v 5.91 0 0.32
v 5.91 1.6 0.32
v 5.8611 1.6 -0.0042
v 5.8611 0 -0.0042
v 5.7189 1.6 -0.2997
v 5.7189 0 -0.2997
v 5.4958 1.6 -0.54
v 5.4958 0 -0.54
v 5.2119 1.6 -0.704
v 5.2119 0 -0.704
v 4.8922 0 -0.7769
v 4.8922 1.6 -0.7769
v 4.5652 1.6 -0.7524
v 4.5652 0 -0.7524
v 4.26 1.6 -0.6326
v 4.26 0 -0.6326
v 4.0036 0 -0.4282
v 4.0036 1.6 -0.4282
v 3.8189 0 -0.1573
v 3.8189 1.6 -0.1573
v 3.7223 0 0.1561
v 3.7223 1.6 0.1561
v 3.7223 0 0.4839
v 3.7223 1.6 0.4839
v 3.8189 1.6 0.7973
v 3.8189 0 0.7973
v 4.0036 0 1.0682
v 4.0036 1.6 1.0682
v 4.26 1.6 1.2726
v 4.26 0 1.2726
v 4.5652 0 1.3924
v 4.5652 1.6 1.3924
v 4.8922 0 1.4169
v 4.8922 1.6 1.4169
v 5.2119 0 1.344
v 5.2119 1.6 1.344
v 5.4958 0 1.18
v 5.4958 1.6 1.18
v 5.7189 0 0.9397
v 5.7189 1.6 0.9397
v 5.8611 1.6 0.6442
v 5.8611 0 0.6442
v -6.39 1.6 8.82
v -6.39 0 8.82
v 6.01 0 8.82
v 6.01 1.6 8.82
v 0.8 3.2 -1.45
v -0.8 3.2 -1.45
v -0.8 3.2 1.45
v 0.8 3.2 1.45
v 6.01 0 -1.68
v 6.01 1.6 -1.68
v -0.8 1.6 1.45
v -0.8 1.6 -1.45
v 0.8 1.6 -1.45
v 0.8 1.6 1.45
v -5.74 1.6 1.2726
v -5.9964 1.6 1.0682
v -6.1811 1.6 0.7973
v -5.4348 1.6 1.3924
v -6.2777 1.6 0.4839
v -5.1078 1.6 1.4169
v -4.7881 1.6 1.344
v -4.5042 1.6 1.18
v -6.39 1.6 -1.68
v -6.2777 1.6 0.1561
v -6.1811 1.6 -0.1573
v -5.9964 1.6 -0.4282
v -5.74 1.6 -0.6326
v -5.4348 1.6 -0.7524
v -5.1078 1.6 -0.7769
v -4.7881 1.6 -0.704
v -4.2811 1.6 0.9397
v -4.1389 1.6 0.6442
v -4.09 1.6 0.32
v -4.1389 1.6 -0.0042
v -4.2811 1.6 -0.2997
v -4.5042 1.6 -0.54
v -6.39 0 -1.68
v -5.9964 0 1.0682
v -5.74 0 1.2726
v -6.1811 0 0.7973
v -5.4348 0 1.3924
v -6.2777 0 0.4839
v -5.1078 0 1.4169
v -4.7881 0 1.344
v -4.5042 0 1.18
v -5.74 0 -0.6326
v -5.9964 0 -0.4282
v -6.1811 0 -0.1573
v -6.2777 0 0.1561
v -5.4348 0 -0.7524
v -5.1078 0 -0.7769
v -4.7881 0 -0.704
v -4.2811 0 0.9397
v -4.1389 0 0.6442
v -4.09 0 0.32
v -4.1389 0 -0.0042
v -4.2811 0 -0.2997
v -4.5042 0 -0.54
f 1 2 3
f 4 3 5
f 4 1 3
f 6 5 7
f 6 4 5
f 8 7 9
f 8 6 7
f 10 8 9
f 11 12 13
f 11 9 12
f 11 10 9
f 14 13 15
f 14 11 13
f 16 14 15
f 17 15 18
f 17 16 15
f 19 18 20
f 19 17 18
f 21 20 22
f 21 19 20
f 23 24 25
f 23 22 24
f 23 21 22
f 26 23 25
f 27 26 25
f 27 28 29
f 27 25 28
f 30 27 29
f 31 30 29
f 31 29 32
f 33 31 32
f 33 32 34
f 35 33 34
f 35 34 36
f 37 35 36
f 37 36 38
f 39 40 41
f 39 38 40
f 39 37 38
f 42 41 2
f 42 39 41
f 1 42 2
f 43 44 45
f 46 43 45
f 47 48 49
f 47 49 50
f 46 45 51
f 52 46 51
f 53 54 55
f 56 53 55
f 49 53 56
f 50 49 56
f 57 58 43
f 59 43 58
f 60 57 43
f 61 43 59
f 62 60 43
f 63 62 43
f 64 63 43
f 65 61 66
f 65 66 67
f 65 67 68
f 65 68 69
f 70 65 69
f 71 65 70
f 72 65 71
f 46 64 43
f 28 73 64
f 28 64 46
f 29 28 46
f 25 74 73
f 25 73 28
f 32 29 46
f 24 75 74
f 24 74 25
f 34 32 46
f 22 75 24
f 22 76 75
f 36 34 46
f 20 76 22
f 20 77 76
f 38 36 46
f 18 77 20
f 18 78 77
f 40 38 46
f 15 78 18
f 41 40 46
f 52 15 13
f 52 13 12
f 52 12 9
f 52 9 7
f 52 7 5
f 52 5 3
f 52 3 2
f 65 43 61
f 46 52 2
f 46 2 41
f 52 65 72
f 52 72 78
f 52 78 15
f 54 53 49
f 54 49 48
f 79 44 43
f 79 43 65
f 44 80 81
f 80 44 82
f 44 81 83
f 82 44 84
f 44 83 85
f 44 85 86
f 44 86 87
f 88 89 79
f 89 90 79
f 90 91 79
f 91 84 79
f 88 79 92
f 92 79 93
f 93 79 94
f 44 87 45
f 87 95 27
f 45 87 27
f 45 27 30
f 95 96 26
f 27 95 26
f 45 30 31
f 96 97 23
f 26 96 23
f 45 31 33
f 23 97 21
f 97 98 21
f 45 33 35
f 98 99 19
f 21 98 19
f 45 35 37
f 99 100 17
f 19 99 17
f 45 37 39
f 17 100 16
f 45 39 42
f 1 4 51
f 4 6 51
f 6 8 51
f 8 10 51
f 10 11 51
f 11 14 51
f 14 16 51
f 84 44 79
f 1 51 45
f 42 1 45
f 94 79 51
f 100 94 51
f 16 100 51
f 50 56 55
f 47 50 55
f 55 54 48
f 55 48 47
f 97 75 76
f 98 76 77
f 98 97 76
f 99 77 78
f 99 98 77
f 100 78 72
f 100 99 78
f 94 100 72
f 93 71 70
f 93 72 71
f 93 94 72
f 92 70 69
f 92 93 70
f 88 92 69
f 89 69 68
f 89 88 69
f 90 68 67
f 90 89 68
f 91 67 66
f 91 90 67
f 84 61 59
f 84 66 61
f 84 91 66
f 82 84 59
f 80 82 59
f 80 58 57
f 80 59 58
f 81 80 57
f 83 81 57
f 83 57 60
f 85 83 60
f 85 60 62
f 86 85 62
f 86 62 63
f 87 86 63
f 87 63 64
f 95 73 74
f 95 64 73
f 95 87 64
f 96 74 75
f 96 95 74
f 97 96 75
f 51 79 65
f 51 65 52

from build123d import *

# Parameters (mm, degrees)
SKETCH1_W           = 12.4
SKETCH1_H           = 10.5
BOSS_EXTRUDE1_DEPTH = 1.6
SKETCH2_R           = 1.1
CUT_EXTRUDE1_DEPTH  = 2.6
SKETCH3_W           = 1.6
SKETCH3_H           = 2.9
BOSS_EXTRUDE2_DEPTH = 1.6


with BuildPart() as part:
    # Sketch1 → Boss-Extrude1 (new body)
    with BuildSketch(Plane(origin=(0, 0, 0), x_dir=(1, 0, 0), z_dir=(0, 1, 0))):
        with Locations((-0.19, -3.57)):
            Rectangle(SKETCH1_W, SKETCH1_H)
    extrude(amount=BOSS_EXTRUDE1_DEPTH)

    # Sketch2 → Cut-Extrude1 (cut, through all)
    with BuildSketch(Plane(origin=(0, 0, 0), x_dir=(1, 0, 0), z_dir=(0, 1, 0))):
        with Locations((4.81, -0.32)):
            Circle(SKETCH2_R)
        with Locations((-5.19, -0.32)):
            Circle(SKETCH2_R)
    extrude(amount=CUT_EXTRUDE1_DEPTH, mode=Mode.SUBTRACT)


with BuildPart() as body_2:
    # Sketch3 → Boss-Extrude2 (new body)
    with BuildSketch(Plane(origin=(0, 1.6, 0), x_dir=(1, 0, 0), z_dir=(0, 1, 0))):
        Rectangle(SKETCH3_W, SKETCH3_H)
    extrude(amount=BOSS_EXTRUDE2_DEPTH)


solid = Compound([part.part, body_2.part])
